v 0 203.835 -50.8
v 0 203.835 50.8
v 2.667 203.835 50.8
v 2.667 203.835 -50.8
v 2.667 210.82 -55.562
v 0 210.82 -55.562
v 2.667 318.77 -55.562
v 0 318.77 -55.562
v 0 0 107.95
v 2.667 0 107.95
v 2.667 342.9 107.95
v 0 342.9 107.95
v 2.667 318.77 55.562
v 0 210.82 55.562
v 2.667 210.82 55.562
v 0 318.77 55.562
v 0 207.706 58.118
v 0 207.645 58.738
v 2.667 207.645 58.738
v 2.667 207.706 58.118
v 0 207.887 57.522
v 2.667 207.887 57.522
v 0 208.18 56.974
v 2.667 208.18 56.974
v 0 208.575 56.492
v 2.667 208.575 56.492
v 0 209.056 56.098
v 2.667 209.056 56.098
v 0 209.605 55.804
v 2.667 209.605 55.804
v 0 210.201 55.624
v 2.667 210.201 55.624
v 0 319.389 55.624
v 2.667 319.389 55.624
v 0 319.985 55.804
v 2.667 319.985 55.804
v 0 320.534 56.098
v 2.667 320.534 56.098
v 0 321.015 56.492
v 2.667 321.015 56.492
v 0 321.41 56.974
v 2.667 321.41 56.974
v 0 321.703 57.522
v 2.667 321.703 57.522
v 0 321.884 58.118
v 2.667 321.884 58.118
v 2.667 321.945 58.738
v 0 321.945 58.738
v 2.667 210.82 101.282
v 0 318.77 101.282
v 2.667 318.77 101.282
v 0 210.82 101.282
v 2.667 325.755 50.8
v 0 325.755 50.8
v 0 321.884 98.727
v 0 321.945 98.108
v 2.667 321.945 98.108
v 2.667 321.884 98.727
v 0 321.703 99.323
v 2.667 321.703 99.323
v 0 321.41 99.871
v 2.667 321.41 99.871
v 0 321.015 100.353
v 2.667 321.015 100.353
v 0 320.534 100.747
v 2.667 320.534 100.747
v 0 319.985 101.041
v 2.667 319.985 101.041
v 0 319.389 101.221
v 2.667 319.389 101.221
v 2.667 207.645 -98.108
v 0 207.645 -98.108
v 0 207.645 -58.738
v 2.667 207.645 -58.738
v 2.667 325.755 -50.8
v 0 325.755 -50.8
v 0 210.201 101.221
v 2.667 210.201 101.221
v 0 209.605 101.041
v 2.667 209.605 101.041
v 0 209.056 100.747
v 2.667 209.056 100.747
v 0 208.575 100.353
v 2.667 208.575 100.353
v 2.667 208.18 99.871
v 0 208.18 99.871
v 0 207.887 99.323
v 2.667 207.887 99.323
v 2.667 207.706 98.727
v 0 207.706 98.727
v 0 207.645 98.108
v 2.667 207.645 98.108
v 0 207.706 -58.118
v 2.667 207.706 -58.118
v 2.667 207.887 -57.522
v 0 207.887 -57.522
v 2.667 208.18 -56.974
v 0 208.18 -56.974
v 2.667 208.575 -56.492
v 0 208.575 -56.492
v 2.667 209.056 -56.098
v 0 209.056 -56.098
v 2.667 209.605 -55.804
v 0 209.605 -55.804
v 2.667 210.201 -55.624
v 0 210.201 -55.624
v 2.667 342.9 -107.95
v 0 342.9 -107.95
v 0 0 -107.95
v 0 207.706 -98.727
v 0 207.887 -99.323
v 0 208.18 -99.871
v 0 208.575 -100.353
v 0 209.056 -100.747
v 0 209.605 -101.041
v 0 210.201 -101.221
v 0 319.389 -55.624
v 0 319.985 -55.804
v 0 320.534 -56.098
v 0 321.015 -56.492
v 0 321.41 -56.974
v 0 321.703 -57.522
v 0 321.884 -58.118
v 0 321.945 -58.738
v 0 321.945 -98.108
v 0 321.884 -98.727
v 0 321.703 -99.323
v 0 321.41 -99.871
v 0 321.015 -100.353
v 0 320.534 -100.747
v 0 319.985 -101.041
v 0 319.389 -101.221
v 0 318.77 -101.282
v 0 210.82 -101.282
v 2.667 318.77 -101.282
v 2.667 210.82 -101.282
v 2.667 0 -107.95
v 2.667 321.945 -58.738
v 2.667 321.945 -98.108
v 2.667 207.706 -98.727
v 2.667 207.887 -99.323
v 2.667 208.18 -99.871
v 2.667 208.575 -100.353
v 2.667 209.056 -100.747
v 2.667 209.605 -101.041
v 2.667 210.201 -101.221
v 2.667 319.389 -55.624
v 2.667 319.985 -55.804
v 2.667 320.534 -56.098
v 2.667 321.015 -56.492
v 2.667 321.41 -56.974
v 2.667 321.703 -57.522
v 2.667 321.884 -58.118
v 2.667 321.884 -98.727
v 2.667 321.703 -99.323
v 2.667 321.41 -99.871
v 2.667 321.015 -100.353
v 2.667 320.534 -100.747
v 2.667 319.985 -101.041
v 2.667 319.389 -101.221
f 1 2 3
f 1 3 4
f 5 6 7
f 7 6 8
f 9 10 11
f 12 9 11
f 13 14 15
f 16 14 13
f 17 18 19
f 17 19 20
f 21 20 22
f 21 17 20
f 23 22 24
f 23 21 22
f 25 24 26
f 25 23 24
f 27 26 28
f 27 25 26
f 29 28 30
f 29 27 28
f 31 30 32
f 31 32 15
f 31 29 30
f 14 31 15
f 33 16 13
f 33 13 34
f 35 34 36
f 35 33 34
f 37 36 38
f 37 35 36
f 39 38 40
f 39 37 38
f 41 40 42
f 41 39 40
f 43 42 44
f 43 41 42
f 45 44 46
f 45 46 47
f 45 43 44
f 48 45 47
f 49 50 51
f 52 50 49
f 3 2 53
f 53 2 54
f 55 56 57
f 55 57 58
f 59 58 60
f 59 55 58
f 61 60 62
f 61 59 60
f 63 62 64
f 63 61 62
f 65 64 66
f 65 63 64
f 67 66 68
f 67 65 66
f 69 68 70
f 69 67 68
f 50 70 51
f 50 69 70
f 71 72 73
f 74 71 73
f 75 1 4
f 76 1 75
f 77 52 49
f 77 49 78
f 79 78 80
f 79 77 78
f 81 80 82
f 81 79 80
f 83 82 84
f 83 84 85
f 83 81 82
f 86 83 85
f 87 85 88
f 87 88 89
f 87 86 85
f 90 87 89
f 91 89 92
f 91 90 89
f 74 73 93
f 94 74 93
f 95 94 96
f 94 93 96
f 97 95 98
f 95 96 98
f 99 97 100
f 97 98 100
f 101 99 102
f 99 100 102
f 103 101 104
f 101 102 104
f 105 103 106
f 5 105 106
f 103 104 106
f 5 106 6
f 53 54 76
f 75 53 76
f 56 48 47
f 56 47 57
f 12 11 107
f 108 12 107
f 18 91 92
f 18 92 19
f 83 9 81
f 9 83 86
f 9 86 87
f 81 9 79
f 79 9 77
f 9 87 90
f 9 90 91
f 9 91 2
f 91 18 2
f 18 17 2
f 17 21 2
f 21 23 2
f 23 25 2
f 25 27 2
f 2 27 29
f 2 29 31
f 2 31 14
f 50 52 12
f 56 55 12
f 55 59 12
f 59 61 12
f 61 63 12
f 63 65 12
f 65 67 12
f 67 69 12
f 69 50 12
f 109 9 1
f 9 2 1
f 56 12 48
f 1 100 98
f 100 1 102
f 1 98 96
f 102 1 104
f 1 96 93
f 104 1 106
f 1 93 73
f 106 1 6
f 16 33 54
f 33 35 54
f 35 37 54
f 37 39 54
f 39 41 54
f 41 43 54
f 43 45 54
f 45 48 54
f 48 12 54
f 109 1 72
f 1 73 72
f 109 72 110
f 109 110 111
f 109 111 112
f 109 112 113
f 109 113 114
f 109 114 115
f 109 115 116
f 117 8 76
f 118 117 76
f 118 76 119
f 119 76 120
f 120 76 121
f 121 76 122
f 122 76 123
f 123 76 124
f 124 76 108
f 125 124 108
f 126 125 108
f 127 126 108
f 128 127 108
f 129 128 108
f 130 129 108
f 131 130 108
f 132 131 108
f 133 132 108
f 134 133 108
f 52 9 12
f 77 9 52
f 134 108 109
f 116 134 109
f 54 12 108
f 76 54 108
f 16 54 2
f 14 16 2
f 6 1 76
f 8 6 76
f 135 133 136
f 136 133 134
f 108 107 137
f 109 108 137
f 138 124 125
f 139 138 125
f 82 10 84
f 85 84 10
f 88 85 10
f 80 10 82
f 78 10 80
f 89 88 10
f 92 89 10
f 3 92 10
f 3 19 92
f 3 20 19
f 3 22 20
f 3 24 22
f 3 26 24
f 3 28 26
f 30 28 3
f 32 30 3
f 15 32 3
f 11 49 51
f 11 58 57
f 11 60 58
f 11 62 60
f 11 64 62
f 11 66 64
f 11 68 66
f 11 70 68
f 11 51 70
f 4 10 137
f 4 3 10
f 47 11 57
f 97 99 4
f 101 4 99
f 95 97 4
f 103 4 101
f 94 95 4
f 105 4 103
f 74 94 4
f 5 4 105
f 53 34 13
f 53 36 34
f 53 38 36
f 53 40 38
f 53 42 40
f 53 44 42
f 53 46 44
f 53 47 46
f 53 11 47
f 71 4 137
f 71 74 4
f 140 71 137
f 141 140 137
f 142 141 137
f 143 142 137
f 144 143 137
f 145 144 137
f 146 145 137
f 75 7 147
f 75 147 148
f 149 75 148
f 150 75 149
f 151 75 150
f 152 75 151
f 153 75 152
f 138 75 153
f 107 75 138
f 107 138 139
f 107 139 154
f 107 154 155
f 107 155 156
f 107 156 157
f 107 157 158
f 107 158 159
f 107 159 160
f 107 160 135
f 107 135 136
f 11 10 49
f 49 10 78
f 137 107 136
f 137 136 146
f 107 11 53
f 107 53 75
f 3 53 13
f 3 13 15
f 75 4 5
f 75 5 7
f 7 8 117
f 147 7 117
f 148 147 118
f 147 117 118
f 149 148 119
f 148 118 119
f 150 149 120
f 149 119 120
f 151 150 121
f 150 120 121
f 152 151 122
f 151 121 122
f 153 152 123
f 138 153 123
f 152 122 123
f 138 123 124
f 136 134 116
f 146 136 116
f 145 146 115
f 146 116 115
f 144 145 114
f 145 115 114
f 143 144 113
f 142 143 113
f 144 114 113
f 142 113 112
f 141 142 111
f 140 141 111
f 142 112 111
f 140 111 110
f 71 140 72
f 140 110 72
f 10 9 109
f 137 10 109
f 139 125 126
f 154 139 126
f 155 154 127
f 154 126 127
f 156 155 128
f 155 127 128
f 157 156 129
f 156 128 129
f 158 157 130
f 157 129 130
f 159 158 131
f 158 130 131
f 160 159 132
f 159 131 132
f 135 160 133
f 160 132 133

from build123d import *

# Parameters (mm, degrees)
SKETCH1_W                   = 228.6
SKETCH1_H                   = 349.25
SKETCH1_W_2                 = 101.6
SKETCH1_H_2                 = 121.92
BOSS_EXTRUDE1_DEPTH         = 2.667
CORNERRADIUSALLOWANCE_DEPTH = 368.487639777


with BuildPart() as part:
    # Sketch1 → Boss-Extrude1 (new body)
    with BuildSketch(Plane(origin=(0, 0, 0), x_dir=(0, 0, -1), z_dir=(1, 0, 0))):
        with Locations((0, 174.625)):
            Rectangle(SKETCH1_W, SKETCH1_H)
        with BuildLine():
            Line((98.1075, 207.645), (58.7375, 207.645))
            ThreePointArc((58.7375, 207.645), (56.49243597, 208.57493597), (55.5625, 210.82))
            Line((55.5625, 210.82), (55.5625, 318.77))
            ThreePointArc((55.5625, 318.77), (56.49243597, 321.01506403), (58.7375, 321.945))
            Line((58.7375, 321.945), (98.1075, 321.945))
            ThreePointArc((98.1075, 321.945), (100.35256403, 321.01506403), (101.2825, 318.77))
            Line((101.2825, 318.77), (101.2825, 210.82))
            ThreePointArc((101.2825, 210.82), (100.35256403, 208.57493597), (98.1075, 207.645))
        make_face(mode=Mode.SUBTRACT)
        with Locations((0, 264.795)):
            Rectangle(SKETCH1_W_2, SKETCH1_H_2, mode=Mode.SUBTRACT)
        with BuildLine():
            Line((-98.1075, 207.645), (-58.7375, 207.645))
            ThreePointArc((-58.7375, 207.645), (-56.49243597, 208.57493597), (-55.5625, 210.82))
            Line((-55.5625, 210.82), (-55.5625, 318.77))
            ThreePointArc((-55.5625, 318.77), (-56.49243597, 321.01506403), (-58.7375, 321.945))
            Line((-58.7375, 321.945), (-98.1075, 321.945))
            ThreePointArc((-98.1075, 321.945), (-100.35256403, 321.01506403), (-101.2825, 318.77))
            Line((-101.2825, 318.77), (-101.2825, 210.82))
            ThreePointArc((-101.2825, 210.82), (-100.35256403, 208.57493597), (-98.1075, 207.645))
        make_face(mode=Mode.SUBTRACT)
    extrude(amount=BOSS_EXTRUDE1_DEPTH)

    # Sketch2 → CornerRadiusAllowance (cut, through all)
    with BuildSketch(Plane(origin=(2.667, 0, 0), x_dir=(0, 0, -1), z_dir=(1, 0, 0))):
        Polygon((114.3, 349.25), (-114.3, 349.25), (-114.3, 0), (-107.95, 0), (-107.95, 342.9), (107.95, 342.9), (107.95, 0), (114.3, 0), align=None)
    extrude(amount=-CORNERRADIUSALLOWANCE_DEPTH, mode=Mode.SUBTRACT)


solid = part.part
